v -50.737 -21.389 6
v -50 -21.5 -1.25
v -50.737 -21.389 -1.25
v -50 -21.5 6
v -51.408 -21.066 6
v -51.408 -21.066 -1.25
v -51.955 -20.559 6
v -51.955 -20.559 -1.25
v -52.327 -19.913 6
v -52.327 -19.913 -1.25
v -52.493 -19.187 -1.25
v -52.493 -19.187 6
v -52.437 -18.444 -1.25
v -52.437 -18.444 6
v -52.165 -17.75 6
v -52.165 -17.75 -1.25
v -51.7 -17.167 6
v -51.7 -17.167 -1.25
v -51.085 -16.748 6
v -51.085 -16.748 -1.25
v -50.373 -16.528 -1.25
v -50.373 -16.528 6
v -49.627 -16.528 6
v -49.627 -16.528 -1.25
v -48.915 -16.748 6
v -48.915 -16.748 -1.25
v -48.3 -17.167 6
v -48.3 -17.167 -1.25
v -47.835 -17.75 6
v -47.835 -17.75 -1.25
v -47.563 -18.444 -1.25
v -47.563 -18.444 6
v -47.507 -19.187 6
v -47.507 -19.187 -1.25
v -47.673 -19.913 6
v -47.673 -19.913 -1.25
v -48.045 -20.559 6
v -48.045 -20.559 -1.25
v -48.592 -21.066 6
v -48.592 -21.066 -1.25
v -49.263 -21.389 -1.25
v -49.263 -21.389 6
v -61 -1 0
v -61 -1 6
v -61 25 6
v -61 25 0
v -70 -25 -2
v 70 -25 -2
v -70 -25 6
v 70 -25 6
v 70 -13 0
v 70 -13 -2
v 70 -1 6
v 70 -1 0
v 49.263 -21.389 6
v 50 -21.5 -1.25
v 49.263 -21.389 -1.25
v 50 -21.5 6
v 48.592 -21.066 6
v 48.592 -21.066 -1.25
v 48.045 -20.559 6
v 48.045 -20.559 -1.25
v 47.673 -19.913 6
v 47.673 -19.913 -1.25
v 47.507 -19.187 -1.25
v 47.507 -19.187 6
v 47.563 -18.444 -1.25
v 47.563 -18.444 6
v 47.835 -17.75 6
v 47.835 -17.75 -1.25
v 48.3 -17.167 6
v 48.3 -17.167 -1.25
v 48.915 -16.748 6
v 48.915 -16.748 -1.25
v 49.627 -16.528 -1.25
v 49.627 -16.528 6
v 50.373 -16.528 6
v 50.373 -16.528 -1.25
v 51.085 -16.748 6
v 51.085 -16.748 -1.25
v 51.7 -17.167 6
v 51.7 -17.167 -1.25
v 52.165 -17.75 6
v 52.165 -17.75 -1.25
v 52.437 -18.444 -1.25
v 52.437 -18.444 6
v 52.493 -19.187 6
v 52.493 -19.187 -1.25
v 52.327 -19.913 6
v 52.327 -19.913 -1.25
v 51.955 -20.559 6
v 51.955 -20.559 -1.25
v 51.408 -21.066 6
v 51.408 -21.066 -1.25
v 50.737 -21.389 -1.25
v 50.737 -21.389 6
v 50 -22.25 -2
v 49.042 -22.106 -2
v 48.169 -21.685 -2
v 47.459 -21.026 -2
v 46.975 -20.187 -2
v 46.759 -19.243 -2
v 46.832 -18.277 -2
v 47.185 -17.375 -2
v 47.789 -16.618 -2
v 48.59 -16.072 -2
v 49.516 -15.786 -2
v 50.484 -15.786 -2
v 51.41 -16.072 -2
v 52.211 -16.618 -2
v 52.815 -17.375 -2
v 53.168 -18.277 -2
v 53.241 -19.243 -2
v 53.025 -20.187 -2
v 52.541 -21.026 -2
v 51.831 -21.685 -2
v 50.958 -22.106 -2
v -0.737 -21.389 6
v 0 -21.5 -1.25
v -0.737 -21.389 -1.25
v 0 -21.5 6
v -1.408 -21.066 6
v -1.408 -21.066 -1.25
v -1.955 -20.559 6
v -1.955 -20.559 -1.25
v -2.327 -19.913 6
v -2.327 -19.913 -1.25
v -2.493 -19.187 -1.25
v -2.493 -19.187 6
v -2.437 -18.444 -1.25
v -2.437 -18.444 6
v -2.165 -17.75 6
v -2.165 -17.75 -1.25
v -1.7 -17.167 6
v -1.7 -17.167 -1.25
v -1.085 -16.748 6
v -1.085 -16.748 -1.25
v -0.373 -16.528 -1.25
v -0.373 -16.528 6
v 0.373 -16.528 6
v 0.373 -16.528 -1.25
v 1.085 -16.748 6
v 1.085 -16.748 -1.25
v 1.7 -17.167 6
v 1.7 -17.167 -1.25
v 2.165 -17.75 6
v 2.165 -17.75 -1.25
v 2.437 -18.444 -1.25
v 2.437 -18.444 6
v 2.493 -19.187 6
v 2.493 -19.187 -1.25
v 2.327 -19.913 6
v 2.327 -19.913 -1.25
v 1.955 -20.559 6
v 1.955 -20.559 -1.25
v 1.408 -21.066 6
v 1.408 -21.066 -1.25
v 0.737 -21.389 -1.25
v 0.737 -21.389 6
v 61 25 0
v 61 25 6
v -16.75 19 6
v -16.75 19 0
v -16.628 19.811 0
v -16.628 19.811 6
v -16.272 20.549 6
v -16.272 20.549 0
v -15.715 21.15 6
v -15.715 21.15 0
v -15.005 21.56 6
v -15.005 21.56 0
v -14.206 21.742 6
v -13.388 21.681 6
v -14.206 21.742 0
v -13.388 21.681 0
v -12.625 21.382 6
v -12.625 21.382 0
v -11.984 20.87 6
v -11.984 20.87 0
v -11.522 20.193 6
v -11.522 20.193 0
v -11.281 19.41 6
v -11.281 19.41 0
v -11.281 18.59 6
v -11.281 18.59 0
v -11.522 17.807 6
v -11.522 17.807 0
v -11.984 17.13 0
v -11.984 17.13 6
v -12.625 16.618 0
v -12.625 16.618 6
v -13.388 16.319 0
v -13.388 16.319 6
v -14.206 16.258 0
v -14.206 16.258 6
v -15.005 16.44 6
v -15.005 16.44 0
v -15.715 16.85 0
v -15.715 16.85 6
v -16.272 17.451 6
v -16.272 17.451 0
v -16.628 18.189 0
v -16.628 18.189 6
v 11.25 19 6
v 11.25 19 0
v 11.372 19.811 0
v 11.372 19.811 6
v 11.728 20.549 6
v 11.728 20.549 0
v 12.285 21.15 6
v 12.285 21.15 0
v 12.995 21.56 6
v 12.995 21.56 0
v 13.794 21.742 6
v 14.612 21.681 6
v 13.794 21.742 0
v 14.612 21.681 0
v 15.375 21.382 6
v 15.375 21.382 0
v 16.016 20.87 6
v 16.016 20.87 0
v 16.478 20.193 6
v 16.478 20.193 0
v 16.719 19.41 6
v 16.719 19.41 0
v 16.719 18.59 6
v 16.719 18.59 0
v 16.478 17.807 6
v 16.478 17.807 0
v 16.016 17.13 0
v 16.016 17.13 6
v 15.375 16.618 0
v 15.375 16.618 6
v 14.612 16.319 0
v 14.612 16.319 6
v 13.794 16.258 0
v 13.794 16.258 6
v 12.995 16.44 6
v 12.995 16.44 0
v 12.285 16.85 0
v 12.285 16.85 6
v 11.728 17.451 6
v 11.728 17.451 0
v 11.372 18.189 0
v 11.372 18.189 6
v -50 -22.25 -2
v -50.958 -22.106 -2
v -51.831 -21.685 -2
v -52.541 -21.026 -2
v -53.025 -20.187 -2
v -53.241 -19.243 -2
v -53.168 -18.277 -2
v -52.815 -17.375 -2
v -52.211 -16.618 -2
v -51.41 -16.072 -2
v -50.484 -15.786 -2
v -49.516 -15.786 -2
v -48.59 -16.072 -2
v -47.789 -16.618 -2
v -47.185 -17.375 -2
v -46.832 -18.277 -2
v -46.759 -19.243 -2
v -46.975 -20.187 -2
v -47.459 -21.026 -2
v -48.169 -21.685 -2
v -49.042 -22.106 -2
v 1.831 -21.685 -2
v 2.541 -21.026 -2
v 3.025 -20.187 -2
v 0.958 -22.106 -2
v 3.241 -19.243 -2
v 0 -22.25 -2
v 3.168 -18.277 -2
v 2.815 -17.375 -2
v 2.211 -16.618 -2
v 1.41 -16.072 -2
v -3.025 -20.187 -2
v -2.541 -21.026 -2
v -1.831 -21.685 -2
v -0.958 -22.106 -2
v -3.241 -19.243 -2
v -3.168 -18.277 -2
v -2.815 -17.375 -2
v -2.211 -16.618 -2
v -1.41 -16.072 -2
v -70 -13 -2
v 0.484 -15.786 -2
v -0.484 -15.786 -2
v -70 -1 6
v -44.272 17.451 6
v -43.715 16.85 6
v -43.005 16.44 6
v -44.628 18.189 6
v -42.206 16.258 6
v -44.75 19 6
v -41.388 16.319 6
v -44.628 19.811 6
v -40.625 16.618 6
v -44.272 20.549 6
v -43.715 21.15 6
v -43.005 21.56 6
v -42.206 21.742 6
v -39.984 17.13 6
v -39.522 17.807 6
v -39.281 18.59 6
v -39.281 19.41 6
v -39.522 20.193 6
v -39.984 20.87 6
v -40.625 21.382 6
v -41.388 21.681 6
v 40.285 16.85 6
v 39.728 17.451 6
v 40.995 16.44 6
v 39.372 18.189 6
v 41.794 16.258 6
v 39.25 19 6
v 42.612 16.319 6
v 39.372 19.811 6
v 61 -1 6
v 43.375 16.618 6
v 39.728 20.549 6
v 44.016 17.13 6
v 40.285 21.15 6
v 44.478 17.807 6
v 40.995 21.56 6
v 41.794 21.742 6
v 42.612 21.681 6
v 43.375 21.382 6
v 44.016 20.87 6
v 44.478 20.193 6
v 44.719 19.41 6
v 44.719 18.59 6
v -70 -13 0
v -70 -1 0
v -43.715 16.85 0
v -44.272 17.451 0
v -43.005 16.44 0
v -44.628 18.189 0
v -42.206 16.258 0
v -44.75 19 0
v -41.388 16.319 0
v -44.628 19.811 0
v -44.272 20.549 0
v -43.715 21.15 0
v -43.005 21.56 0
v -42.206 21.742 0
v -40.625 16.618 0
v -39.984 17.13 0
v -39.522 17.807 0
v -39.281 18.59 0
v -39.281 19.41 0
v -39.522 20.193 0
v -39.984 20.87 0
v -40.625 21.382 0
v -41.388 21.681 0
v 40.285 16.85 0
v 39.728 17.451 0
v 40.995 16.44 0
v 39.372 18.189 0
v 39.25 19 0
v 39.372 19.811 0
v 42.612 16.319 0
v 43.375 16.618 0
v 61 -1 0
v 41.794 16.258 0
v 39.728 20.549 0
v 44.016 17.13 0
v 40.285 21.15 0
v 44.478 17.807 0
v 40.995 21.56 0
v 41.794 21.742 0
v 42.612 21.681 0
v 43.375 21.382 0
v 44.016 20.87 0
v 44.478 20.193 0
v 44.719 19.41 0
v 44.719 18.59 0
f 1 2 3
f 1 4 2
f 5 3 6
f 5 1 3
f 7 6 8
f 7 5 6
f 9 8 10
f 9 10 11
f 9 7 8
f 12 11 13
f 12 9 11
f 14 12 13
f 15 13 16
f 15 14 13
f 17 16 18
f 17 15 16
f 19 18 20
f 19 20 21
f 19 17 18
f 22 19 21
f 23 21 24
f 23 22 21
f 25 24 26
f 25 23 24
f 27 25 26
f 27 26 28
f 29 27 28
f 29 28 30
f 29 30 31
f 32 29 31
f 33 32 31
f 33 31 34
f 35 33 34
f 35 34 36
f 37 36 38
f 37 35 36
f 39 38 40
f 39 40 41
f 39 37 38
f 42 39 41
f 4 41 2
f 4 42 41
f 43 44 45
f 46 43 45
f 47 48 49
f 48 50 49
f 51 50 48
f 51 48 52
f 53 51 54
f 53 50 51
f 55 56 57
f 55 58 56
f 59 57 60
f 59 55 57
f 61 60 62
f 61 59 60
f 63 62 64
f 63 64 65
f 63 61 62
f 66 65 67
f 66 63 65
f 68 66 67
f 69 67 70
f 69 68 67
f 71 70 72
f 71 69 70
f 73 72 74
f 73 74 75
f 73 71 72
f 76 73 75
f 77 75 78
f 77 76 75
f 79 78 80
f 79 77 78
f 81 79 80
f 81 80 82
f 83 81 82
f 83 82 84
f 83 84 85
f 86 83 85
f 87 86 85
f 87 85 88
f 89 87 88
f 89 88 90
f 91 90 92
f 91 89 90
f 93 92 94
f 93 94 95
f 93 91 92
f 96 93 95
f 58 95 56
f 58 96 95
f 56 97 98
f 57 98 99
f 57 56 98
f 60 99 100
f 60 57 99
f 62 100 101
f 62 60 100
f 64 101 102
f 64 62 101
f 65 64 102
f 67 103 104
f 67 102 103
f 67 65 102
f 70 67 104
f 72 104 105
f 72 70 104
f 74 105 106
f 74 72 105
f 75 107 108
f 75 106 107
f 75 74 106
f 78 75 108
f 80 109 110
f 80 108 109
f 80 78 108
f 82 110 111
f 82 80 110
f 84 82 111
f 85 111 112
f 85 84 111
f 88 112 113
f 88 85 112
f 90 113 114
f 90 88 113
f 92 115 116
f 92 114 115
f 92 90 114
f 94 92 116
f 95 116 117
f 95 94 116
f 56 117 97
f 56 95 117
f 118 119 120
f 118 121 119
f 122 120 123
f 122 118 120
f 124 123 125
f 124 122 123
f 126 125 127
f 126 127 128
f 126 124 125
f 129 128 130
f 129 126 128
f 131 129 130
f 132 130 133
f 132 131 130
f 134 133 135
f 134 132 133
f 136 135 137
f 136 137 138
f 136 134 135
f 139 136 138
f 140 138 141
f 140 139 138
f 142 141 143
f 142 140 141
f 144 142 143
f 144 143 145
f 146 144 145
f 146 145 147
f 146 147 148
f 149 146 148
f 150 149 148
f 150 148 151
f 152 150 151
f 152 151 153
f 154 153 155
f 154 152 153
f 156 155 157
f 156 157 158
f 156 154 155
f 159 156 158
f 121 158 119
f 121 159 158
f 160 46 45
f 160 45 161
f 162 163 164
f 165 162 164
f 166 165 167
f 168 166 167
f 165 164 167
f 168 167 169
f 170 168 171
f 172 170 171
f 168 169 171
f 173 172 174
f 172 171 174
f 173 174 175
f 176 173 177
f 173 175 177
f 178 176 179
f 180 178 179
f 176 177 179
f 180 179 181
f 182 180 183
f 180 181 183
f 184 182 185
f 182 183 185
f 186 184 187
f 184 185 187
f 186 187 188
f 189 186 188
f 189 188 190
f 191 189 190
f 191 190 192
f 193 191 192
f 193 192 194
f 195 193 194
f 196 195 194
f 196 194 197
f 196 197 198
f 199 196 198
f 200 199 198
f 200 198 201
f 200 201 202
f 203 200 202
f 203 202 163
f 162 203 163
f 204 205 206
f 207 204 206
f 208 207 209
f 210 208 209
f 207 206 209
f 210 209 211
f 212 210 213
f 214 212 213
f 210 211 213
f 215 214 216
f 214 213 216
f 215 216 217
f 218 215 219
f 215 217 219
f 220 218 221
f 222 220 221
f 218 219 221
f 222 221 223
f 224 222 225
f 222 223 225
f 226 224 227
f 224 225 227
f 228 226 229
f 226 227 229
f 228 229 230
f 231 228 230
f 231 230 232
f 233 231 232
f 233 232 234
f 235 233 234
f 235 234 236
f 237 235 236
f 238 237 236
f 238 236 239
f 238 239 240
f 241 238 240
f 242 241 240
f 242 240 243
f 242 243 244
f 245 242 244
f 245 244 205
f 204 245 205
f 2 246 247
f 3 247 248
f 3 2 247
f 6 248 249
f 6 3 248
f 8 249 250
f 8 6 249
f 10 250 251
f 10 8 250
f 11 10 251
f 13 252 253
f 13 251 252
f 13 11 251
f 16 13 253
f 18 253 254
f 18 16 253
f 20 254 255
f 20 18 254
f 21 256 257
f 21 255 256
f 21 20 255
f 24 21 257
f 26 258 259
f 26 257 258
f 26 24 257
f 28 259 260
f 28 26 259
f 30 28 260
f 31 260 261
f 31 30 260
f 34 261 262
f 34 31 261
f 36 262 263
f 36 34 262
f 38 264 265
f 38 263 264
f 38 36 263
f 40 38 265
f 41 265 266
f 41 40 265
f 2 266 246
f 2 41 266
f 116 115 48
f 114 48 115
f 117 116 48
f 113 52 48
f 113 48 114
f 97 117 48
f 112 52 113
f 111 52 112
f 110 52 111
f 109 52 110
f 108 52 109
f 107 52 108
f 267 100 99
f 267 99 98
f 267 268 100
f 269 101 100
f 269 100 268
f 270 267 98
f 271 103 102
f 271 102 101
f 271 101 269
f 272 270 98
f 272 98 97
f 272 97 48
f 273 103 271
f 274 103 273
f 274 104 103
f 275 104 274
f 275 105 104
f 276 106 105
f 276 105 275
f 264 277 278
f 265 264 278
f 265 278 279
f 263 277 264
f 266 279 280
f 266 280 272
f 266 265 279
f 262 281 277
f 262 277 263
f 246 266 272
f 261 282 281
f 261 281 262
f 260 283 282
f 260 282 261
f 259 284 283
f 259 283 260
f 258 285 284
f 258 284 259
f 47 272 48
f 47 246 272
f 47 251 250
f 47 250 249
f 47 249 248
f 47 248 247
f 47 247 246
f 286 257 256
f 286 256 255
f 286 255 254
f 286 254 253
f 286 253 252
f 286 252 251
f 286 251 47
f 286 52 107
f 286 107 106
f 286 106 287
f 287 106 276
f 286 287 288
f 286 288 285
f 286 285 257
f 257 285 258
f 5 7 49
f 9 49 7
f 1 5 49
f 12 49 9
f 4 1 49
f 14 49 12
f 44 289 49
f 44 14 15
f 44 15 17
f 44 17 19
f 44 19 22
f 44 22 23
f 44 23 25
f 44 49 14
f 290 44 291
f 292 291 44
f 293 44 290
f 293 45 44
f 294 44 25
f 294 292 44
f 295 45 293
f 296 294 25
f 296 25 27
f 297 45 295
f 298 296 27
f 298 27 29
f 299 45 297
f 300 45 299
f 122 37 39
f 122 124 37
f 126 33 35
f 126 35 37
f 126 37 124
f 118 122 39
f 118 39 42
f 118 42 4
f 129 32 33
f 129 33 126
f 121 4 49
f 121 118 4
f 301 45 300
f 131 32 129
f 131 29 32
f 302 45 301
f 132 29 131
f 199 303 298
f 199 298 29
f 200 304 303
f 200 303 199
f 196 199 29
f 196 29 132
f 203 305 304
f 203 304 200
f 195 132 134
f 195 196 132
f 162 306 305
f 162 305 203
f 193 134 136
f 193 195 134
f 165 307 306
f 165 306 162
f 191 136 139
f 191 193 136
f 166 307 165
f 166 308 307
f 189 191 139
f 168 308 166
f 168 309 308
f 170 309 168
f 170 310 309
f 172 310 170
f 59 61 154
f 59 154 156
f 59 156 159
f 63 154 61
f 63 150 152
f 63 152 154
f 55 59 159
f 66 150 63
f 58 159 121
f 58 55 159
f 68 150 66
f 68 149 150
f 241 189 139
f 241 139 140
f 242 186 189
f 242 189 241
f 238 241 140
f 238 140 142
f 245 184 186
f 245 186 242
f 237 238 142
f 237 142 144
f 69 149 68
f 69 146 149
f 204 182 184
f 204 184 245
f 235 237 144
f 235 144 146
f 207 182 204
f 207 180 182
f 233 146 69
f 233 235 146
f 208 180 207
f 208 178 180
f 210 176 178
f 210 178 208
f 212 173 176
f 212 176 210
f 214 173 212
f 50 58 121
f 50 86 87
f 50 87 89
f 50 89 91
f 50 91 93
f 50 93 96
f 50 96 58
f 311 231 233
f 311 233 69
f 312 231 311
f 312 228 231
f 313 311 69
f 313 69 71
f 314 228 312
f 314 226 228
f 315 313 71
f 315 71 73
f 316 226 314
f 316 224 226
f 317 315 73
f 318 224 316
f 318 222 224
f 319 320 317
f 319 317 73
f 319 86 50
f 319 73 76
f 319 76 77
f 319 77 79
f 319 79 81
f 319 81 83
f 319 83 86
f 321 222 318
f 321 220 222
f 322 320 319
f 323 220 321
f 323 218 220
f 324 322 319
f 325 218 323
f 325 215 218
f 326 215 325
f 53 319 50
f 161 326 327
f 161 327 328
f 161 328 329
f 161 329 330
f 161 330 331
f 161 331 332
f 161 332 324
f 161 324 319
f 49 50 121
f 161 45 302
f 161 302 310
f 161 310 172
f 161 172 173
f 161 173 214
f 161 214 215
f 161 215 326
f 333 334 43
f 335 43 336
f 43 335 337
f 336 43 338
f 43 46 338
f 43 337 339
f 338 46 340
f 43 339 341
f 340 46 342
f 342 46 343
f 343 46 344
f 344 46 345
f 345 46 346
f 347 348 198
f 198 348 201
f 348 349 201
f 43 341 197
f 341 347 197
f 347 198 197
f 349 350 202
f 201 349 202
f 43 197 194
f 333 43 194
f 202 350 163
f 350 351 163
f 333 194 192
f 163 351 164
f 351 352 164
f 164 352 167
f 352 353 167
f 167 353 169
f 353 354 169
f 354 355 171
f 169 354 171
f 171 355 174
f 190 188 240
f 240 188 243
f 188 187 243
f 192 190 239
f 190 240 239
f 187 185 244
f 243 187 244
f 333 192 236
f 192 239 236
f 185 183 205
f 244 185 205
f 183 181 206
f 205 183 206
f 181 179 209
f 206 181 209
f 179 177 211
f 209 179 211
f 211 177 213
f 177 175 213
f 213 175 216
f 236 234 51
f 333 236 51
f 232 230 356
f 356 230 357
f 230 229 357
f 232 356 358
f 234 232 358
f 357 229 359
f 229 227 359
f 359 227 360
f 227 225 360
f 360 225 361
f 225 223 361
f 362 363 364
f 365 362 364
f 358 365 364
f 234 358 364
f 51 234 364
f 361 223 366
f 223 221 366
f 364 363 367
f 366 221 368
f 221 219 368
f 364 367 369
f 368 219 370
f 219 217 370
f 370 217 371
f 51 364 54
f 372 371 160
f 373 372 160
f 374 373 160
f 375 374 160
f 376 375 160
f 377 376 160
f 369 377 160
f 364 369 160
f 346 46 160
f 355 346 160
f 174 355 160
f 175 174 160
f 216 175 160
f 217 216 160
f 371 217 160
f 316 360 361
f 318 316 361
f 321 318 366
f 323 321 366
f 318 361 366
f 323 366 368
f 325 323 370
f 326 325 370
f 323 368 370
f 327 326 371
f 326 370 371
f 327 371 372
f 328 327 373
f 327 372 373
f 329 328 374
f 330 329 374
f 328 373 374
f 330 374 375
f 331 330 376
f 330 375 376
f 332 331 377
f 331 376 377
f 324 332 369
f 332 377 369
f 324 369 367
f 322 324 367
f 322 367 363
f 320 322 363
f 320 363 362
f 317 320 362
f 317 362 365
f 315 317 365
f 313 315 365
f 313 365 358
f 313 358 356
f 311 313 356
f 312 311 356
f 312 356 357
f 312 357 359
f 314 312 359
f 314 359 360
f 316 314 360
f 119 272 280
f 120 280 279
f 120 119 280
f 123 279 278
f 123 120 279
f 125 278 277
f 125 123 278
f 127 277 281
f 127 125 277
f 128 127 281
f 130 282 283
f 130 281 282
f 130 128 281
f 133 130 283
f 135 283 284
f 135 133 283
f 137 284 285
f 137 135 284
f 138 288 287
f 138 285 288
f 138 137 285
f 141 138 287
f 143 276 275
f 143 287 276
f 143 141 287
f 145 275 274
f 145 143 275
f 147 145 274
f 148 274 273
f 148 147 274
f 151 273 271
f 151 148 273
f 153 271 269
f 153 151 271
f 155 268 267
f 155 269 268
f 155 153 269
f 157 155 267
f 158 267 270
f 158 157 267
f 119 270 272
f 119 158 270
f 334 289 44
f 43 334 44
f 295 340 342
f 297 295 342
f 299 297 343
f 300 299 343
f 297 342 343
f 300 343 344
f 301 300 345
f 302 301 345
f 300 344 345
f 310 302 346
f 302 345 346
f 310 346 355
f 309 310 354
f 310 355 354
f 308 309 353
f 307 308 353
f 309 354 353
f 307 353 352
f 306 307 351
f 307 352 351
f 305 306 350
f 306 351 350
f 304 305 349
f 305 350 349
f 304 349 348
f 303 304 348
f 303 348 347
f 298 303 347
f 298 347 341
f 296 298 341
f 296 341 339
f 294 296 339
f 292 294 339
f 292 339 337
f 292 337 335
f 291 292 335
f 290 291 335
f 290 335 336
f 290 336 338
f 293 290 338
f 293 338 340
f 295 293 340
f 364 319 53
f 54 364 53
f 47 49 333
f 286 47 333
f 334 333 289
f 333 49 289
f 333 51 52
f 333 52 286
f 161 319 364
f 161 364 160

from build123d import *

# Parameters (mm, degrees)
SKETCH_1_W          = 140
SKETCH_1_H          = 50
EXTRUDE_1_DEPTH     = 6
SKETCH_6_R          = 2.75
CUT_EXTRUDE_4_DEPTH = 7
SKETCH_5_W          = 140
SKETCH_5_H          = 12
EXTRUDE_3_DEPTH     = 2
M6X1_01_AT_2_COUNT  = 2
M6X1_01_AT_2_PITCH  = 50
M6X1_01_AT_3_COUNT  = 2
M6X1_01_AT_3_PITCH  = 50
SKETCH_4_W          = 9
SKETCH_4_H          = 26
CUT_EXTRUDE_2_DEPTH = 9


with BuildPart() as part:
    # Эскиз1 → Вытянуть1 (new body)
    with BuildSketch(Plane.XY):
        Rectangle(SKETCH_1_W, SKETCH_1_H)
    extrude(amount=EXTRUDE_1_DEPTH)

    # Эскиз6 → Вытянуть4 (cut, through all)
    with BuildSketch(Plane(origin=(0, 0, 0), x_dir=(-1, 0, 0), z_dir=(0, 0, -1))):
        with Locations((42, 19)):
            Circle(SKETCH_6_R)
        with Locations((14, 19)):
            Circle(SKETCH_6_R)
        with Locations((-14, 19)):
            Circle(SKETCH_6_R)
        with Locations((-42, 19)):
            Circle(SKETCH_6_R)
    extrude(amount=-CUT_EXTRUDE_4_DEPTH, mode=Mode.SUBTRACT)

    # Эскиз5 → Вытянуть3 (add)
    with BuildSketch(Plane(origin=(0, 0, 0), x_dir=(-1, 0, 0), z_dir=(0, 0, -1))):
        with Locations((0, -19)):
            Rectangle(SKETCH_5_W, SKETCH_5_H)
    extrude(amount=EXTRUDE_3_DEPTH)

    # Эскиз2 → Отверстие обработанное метчиком M6x1.01 (revolve, cut)
    with BuildSketch(Plane(origin=(0, -19, 6), x_dir=(0, -1, 0), z_dir=(1, 0, 0))):
        Polygon((0, 0), (0, 8.000025), (3.25, 8.000025), (2.5, 7.250025), (2.5, 0), align=None)
    m6x1_01 = revolve(axis=Axis((0, -19, 12.35), (0, 0, -1)), mode=Mode.SUBTRACT)

    # Отверстие обработанное метчиком M6x1.01 at 2: Отверстие обработанное метчиком M6x1.01 ×2
    with Locations(*[(-i * M6X1_01_AT_2_PITCH, 0, 0) for i in range(1, M6X1_01_AT_2_COUNT)]):
        add(m6x1_01, mode=Mode.SUBTRACT)

    # Отверстие обработанное метчиком M6x1.01 at 3: Отверстие обработанное метчиком M6x1.01 ×2
    with Locations(*[(i * M6X1_01_AT_3_PITCH, 0, 0) for i in range(1, M6X1_01_AT_3_COUNT)]):
        add(m6x1_01, mode=Mode.SUBTRACT)

    # Эскиз4 → Вытянуть2 (cut, through all)
    with BuildSketch(Plane.XY.offset(6)):
        with Locations((-65.5, 12)):
            Rectangle(SKETCH_4_W, SKETCH_4_H)
        with Locations((65.5, 12)):
            Rectangle(SKETCH_4_W, SKETCH_4_H)
    extrude(amount=-CUT_EXTRUDE_2_DEPTH, mode=Mode.SUBTRACT)


solid = part.part
